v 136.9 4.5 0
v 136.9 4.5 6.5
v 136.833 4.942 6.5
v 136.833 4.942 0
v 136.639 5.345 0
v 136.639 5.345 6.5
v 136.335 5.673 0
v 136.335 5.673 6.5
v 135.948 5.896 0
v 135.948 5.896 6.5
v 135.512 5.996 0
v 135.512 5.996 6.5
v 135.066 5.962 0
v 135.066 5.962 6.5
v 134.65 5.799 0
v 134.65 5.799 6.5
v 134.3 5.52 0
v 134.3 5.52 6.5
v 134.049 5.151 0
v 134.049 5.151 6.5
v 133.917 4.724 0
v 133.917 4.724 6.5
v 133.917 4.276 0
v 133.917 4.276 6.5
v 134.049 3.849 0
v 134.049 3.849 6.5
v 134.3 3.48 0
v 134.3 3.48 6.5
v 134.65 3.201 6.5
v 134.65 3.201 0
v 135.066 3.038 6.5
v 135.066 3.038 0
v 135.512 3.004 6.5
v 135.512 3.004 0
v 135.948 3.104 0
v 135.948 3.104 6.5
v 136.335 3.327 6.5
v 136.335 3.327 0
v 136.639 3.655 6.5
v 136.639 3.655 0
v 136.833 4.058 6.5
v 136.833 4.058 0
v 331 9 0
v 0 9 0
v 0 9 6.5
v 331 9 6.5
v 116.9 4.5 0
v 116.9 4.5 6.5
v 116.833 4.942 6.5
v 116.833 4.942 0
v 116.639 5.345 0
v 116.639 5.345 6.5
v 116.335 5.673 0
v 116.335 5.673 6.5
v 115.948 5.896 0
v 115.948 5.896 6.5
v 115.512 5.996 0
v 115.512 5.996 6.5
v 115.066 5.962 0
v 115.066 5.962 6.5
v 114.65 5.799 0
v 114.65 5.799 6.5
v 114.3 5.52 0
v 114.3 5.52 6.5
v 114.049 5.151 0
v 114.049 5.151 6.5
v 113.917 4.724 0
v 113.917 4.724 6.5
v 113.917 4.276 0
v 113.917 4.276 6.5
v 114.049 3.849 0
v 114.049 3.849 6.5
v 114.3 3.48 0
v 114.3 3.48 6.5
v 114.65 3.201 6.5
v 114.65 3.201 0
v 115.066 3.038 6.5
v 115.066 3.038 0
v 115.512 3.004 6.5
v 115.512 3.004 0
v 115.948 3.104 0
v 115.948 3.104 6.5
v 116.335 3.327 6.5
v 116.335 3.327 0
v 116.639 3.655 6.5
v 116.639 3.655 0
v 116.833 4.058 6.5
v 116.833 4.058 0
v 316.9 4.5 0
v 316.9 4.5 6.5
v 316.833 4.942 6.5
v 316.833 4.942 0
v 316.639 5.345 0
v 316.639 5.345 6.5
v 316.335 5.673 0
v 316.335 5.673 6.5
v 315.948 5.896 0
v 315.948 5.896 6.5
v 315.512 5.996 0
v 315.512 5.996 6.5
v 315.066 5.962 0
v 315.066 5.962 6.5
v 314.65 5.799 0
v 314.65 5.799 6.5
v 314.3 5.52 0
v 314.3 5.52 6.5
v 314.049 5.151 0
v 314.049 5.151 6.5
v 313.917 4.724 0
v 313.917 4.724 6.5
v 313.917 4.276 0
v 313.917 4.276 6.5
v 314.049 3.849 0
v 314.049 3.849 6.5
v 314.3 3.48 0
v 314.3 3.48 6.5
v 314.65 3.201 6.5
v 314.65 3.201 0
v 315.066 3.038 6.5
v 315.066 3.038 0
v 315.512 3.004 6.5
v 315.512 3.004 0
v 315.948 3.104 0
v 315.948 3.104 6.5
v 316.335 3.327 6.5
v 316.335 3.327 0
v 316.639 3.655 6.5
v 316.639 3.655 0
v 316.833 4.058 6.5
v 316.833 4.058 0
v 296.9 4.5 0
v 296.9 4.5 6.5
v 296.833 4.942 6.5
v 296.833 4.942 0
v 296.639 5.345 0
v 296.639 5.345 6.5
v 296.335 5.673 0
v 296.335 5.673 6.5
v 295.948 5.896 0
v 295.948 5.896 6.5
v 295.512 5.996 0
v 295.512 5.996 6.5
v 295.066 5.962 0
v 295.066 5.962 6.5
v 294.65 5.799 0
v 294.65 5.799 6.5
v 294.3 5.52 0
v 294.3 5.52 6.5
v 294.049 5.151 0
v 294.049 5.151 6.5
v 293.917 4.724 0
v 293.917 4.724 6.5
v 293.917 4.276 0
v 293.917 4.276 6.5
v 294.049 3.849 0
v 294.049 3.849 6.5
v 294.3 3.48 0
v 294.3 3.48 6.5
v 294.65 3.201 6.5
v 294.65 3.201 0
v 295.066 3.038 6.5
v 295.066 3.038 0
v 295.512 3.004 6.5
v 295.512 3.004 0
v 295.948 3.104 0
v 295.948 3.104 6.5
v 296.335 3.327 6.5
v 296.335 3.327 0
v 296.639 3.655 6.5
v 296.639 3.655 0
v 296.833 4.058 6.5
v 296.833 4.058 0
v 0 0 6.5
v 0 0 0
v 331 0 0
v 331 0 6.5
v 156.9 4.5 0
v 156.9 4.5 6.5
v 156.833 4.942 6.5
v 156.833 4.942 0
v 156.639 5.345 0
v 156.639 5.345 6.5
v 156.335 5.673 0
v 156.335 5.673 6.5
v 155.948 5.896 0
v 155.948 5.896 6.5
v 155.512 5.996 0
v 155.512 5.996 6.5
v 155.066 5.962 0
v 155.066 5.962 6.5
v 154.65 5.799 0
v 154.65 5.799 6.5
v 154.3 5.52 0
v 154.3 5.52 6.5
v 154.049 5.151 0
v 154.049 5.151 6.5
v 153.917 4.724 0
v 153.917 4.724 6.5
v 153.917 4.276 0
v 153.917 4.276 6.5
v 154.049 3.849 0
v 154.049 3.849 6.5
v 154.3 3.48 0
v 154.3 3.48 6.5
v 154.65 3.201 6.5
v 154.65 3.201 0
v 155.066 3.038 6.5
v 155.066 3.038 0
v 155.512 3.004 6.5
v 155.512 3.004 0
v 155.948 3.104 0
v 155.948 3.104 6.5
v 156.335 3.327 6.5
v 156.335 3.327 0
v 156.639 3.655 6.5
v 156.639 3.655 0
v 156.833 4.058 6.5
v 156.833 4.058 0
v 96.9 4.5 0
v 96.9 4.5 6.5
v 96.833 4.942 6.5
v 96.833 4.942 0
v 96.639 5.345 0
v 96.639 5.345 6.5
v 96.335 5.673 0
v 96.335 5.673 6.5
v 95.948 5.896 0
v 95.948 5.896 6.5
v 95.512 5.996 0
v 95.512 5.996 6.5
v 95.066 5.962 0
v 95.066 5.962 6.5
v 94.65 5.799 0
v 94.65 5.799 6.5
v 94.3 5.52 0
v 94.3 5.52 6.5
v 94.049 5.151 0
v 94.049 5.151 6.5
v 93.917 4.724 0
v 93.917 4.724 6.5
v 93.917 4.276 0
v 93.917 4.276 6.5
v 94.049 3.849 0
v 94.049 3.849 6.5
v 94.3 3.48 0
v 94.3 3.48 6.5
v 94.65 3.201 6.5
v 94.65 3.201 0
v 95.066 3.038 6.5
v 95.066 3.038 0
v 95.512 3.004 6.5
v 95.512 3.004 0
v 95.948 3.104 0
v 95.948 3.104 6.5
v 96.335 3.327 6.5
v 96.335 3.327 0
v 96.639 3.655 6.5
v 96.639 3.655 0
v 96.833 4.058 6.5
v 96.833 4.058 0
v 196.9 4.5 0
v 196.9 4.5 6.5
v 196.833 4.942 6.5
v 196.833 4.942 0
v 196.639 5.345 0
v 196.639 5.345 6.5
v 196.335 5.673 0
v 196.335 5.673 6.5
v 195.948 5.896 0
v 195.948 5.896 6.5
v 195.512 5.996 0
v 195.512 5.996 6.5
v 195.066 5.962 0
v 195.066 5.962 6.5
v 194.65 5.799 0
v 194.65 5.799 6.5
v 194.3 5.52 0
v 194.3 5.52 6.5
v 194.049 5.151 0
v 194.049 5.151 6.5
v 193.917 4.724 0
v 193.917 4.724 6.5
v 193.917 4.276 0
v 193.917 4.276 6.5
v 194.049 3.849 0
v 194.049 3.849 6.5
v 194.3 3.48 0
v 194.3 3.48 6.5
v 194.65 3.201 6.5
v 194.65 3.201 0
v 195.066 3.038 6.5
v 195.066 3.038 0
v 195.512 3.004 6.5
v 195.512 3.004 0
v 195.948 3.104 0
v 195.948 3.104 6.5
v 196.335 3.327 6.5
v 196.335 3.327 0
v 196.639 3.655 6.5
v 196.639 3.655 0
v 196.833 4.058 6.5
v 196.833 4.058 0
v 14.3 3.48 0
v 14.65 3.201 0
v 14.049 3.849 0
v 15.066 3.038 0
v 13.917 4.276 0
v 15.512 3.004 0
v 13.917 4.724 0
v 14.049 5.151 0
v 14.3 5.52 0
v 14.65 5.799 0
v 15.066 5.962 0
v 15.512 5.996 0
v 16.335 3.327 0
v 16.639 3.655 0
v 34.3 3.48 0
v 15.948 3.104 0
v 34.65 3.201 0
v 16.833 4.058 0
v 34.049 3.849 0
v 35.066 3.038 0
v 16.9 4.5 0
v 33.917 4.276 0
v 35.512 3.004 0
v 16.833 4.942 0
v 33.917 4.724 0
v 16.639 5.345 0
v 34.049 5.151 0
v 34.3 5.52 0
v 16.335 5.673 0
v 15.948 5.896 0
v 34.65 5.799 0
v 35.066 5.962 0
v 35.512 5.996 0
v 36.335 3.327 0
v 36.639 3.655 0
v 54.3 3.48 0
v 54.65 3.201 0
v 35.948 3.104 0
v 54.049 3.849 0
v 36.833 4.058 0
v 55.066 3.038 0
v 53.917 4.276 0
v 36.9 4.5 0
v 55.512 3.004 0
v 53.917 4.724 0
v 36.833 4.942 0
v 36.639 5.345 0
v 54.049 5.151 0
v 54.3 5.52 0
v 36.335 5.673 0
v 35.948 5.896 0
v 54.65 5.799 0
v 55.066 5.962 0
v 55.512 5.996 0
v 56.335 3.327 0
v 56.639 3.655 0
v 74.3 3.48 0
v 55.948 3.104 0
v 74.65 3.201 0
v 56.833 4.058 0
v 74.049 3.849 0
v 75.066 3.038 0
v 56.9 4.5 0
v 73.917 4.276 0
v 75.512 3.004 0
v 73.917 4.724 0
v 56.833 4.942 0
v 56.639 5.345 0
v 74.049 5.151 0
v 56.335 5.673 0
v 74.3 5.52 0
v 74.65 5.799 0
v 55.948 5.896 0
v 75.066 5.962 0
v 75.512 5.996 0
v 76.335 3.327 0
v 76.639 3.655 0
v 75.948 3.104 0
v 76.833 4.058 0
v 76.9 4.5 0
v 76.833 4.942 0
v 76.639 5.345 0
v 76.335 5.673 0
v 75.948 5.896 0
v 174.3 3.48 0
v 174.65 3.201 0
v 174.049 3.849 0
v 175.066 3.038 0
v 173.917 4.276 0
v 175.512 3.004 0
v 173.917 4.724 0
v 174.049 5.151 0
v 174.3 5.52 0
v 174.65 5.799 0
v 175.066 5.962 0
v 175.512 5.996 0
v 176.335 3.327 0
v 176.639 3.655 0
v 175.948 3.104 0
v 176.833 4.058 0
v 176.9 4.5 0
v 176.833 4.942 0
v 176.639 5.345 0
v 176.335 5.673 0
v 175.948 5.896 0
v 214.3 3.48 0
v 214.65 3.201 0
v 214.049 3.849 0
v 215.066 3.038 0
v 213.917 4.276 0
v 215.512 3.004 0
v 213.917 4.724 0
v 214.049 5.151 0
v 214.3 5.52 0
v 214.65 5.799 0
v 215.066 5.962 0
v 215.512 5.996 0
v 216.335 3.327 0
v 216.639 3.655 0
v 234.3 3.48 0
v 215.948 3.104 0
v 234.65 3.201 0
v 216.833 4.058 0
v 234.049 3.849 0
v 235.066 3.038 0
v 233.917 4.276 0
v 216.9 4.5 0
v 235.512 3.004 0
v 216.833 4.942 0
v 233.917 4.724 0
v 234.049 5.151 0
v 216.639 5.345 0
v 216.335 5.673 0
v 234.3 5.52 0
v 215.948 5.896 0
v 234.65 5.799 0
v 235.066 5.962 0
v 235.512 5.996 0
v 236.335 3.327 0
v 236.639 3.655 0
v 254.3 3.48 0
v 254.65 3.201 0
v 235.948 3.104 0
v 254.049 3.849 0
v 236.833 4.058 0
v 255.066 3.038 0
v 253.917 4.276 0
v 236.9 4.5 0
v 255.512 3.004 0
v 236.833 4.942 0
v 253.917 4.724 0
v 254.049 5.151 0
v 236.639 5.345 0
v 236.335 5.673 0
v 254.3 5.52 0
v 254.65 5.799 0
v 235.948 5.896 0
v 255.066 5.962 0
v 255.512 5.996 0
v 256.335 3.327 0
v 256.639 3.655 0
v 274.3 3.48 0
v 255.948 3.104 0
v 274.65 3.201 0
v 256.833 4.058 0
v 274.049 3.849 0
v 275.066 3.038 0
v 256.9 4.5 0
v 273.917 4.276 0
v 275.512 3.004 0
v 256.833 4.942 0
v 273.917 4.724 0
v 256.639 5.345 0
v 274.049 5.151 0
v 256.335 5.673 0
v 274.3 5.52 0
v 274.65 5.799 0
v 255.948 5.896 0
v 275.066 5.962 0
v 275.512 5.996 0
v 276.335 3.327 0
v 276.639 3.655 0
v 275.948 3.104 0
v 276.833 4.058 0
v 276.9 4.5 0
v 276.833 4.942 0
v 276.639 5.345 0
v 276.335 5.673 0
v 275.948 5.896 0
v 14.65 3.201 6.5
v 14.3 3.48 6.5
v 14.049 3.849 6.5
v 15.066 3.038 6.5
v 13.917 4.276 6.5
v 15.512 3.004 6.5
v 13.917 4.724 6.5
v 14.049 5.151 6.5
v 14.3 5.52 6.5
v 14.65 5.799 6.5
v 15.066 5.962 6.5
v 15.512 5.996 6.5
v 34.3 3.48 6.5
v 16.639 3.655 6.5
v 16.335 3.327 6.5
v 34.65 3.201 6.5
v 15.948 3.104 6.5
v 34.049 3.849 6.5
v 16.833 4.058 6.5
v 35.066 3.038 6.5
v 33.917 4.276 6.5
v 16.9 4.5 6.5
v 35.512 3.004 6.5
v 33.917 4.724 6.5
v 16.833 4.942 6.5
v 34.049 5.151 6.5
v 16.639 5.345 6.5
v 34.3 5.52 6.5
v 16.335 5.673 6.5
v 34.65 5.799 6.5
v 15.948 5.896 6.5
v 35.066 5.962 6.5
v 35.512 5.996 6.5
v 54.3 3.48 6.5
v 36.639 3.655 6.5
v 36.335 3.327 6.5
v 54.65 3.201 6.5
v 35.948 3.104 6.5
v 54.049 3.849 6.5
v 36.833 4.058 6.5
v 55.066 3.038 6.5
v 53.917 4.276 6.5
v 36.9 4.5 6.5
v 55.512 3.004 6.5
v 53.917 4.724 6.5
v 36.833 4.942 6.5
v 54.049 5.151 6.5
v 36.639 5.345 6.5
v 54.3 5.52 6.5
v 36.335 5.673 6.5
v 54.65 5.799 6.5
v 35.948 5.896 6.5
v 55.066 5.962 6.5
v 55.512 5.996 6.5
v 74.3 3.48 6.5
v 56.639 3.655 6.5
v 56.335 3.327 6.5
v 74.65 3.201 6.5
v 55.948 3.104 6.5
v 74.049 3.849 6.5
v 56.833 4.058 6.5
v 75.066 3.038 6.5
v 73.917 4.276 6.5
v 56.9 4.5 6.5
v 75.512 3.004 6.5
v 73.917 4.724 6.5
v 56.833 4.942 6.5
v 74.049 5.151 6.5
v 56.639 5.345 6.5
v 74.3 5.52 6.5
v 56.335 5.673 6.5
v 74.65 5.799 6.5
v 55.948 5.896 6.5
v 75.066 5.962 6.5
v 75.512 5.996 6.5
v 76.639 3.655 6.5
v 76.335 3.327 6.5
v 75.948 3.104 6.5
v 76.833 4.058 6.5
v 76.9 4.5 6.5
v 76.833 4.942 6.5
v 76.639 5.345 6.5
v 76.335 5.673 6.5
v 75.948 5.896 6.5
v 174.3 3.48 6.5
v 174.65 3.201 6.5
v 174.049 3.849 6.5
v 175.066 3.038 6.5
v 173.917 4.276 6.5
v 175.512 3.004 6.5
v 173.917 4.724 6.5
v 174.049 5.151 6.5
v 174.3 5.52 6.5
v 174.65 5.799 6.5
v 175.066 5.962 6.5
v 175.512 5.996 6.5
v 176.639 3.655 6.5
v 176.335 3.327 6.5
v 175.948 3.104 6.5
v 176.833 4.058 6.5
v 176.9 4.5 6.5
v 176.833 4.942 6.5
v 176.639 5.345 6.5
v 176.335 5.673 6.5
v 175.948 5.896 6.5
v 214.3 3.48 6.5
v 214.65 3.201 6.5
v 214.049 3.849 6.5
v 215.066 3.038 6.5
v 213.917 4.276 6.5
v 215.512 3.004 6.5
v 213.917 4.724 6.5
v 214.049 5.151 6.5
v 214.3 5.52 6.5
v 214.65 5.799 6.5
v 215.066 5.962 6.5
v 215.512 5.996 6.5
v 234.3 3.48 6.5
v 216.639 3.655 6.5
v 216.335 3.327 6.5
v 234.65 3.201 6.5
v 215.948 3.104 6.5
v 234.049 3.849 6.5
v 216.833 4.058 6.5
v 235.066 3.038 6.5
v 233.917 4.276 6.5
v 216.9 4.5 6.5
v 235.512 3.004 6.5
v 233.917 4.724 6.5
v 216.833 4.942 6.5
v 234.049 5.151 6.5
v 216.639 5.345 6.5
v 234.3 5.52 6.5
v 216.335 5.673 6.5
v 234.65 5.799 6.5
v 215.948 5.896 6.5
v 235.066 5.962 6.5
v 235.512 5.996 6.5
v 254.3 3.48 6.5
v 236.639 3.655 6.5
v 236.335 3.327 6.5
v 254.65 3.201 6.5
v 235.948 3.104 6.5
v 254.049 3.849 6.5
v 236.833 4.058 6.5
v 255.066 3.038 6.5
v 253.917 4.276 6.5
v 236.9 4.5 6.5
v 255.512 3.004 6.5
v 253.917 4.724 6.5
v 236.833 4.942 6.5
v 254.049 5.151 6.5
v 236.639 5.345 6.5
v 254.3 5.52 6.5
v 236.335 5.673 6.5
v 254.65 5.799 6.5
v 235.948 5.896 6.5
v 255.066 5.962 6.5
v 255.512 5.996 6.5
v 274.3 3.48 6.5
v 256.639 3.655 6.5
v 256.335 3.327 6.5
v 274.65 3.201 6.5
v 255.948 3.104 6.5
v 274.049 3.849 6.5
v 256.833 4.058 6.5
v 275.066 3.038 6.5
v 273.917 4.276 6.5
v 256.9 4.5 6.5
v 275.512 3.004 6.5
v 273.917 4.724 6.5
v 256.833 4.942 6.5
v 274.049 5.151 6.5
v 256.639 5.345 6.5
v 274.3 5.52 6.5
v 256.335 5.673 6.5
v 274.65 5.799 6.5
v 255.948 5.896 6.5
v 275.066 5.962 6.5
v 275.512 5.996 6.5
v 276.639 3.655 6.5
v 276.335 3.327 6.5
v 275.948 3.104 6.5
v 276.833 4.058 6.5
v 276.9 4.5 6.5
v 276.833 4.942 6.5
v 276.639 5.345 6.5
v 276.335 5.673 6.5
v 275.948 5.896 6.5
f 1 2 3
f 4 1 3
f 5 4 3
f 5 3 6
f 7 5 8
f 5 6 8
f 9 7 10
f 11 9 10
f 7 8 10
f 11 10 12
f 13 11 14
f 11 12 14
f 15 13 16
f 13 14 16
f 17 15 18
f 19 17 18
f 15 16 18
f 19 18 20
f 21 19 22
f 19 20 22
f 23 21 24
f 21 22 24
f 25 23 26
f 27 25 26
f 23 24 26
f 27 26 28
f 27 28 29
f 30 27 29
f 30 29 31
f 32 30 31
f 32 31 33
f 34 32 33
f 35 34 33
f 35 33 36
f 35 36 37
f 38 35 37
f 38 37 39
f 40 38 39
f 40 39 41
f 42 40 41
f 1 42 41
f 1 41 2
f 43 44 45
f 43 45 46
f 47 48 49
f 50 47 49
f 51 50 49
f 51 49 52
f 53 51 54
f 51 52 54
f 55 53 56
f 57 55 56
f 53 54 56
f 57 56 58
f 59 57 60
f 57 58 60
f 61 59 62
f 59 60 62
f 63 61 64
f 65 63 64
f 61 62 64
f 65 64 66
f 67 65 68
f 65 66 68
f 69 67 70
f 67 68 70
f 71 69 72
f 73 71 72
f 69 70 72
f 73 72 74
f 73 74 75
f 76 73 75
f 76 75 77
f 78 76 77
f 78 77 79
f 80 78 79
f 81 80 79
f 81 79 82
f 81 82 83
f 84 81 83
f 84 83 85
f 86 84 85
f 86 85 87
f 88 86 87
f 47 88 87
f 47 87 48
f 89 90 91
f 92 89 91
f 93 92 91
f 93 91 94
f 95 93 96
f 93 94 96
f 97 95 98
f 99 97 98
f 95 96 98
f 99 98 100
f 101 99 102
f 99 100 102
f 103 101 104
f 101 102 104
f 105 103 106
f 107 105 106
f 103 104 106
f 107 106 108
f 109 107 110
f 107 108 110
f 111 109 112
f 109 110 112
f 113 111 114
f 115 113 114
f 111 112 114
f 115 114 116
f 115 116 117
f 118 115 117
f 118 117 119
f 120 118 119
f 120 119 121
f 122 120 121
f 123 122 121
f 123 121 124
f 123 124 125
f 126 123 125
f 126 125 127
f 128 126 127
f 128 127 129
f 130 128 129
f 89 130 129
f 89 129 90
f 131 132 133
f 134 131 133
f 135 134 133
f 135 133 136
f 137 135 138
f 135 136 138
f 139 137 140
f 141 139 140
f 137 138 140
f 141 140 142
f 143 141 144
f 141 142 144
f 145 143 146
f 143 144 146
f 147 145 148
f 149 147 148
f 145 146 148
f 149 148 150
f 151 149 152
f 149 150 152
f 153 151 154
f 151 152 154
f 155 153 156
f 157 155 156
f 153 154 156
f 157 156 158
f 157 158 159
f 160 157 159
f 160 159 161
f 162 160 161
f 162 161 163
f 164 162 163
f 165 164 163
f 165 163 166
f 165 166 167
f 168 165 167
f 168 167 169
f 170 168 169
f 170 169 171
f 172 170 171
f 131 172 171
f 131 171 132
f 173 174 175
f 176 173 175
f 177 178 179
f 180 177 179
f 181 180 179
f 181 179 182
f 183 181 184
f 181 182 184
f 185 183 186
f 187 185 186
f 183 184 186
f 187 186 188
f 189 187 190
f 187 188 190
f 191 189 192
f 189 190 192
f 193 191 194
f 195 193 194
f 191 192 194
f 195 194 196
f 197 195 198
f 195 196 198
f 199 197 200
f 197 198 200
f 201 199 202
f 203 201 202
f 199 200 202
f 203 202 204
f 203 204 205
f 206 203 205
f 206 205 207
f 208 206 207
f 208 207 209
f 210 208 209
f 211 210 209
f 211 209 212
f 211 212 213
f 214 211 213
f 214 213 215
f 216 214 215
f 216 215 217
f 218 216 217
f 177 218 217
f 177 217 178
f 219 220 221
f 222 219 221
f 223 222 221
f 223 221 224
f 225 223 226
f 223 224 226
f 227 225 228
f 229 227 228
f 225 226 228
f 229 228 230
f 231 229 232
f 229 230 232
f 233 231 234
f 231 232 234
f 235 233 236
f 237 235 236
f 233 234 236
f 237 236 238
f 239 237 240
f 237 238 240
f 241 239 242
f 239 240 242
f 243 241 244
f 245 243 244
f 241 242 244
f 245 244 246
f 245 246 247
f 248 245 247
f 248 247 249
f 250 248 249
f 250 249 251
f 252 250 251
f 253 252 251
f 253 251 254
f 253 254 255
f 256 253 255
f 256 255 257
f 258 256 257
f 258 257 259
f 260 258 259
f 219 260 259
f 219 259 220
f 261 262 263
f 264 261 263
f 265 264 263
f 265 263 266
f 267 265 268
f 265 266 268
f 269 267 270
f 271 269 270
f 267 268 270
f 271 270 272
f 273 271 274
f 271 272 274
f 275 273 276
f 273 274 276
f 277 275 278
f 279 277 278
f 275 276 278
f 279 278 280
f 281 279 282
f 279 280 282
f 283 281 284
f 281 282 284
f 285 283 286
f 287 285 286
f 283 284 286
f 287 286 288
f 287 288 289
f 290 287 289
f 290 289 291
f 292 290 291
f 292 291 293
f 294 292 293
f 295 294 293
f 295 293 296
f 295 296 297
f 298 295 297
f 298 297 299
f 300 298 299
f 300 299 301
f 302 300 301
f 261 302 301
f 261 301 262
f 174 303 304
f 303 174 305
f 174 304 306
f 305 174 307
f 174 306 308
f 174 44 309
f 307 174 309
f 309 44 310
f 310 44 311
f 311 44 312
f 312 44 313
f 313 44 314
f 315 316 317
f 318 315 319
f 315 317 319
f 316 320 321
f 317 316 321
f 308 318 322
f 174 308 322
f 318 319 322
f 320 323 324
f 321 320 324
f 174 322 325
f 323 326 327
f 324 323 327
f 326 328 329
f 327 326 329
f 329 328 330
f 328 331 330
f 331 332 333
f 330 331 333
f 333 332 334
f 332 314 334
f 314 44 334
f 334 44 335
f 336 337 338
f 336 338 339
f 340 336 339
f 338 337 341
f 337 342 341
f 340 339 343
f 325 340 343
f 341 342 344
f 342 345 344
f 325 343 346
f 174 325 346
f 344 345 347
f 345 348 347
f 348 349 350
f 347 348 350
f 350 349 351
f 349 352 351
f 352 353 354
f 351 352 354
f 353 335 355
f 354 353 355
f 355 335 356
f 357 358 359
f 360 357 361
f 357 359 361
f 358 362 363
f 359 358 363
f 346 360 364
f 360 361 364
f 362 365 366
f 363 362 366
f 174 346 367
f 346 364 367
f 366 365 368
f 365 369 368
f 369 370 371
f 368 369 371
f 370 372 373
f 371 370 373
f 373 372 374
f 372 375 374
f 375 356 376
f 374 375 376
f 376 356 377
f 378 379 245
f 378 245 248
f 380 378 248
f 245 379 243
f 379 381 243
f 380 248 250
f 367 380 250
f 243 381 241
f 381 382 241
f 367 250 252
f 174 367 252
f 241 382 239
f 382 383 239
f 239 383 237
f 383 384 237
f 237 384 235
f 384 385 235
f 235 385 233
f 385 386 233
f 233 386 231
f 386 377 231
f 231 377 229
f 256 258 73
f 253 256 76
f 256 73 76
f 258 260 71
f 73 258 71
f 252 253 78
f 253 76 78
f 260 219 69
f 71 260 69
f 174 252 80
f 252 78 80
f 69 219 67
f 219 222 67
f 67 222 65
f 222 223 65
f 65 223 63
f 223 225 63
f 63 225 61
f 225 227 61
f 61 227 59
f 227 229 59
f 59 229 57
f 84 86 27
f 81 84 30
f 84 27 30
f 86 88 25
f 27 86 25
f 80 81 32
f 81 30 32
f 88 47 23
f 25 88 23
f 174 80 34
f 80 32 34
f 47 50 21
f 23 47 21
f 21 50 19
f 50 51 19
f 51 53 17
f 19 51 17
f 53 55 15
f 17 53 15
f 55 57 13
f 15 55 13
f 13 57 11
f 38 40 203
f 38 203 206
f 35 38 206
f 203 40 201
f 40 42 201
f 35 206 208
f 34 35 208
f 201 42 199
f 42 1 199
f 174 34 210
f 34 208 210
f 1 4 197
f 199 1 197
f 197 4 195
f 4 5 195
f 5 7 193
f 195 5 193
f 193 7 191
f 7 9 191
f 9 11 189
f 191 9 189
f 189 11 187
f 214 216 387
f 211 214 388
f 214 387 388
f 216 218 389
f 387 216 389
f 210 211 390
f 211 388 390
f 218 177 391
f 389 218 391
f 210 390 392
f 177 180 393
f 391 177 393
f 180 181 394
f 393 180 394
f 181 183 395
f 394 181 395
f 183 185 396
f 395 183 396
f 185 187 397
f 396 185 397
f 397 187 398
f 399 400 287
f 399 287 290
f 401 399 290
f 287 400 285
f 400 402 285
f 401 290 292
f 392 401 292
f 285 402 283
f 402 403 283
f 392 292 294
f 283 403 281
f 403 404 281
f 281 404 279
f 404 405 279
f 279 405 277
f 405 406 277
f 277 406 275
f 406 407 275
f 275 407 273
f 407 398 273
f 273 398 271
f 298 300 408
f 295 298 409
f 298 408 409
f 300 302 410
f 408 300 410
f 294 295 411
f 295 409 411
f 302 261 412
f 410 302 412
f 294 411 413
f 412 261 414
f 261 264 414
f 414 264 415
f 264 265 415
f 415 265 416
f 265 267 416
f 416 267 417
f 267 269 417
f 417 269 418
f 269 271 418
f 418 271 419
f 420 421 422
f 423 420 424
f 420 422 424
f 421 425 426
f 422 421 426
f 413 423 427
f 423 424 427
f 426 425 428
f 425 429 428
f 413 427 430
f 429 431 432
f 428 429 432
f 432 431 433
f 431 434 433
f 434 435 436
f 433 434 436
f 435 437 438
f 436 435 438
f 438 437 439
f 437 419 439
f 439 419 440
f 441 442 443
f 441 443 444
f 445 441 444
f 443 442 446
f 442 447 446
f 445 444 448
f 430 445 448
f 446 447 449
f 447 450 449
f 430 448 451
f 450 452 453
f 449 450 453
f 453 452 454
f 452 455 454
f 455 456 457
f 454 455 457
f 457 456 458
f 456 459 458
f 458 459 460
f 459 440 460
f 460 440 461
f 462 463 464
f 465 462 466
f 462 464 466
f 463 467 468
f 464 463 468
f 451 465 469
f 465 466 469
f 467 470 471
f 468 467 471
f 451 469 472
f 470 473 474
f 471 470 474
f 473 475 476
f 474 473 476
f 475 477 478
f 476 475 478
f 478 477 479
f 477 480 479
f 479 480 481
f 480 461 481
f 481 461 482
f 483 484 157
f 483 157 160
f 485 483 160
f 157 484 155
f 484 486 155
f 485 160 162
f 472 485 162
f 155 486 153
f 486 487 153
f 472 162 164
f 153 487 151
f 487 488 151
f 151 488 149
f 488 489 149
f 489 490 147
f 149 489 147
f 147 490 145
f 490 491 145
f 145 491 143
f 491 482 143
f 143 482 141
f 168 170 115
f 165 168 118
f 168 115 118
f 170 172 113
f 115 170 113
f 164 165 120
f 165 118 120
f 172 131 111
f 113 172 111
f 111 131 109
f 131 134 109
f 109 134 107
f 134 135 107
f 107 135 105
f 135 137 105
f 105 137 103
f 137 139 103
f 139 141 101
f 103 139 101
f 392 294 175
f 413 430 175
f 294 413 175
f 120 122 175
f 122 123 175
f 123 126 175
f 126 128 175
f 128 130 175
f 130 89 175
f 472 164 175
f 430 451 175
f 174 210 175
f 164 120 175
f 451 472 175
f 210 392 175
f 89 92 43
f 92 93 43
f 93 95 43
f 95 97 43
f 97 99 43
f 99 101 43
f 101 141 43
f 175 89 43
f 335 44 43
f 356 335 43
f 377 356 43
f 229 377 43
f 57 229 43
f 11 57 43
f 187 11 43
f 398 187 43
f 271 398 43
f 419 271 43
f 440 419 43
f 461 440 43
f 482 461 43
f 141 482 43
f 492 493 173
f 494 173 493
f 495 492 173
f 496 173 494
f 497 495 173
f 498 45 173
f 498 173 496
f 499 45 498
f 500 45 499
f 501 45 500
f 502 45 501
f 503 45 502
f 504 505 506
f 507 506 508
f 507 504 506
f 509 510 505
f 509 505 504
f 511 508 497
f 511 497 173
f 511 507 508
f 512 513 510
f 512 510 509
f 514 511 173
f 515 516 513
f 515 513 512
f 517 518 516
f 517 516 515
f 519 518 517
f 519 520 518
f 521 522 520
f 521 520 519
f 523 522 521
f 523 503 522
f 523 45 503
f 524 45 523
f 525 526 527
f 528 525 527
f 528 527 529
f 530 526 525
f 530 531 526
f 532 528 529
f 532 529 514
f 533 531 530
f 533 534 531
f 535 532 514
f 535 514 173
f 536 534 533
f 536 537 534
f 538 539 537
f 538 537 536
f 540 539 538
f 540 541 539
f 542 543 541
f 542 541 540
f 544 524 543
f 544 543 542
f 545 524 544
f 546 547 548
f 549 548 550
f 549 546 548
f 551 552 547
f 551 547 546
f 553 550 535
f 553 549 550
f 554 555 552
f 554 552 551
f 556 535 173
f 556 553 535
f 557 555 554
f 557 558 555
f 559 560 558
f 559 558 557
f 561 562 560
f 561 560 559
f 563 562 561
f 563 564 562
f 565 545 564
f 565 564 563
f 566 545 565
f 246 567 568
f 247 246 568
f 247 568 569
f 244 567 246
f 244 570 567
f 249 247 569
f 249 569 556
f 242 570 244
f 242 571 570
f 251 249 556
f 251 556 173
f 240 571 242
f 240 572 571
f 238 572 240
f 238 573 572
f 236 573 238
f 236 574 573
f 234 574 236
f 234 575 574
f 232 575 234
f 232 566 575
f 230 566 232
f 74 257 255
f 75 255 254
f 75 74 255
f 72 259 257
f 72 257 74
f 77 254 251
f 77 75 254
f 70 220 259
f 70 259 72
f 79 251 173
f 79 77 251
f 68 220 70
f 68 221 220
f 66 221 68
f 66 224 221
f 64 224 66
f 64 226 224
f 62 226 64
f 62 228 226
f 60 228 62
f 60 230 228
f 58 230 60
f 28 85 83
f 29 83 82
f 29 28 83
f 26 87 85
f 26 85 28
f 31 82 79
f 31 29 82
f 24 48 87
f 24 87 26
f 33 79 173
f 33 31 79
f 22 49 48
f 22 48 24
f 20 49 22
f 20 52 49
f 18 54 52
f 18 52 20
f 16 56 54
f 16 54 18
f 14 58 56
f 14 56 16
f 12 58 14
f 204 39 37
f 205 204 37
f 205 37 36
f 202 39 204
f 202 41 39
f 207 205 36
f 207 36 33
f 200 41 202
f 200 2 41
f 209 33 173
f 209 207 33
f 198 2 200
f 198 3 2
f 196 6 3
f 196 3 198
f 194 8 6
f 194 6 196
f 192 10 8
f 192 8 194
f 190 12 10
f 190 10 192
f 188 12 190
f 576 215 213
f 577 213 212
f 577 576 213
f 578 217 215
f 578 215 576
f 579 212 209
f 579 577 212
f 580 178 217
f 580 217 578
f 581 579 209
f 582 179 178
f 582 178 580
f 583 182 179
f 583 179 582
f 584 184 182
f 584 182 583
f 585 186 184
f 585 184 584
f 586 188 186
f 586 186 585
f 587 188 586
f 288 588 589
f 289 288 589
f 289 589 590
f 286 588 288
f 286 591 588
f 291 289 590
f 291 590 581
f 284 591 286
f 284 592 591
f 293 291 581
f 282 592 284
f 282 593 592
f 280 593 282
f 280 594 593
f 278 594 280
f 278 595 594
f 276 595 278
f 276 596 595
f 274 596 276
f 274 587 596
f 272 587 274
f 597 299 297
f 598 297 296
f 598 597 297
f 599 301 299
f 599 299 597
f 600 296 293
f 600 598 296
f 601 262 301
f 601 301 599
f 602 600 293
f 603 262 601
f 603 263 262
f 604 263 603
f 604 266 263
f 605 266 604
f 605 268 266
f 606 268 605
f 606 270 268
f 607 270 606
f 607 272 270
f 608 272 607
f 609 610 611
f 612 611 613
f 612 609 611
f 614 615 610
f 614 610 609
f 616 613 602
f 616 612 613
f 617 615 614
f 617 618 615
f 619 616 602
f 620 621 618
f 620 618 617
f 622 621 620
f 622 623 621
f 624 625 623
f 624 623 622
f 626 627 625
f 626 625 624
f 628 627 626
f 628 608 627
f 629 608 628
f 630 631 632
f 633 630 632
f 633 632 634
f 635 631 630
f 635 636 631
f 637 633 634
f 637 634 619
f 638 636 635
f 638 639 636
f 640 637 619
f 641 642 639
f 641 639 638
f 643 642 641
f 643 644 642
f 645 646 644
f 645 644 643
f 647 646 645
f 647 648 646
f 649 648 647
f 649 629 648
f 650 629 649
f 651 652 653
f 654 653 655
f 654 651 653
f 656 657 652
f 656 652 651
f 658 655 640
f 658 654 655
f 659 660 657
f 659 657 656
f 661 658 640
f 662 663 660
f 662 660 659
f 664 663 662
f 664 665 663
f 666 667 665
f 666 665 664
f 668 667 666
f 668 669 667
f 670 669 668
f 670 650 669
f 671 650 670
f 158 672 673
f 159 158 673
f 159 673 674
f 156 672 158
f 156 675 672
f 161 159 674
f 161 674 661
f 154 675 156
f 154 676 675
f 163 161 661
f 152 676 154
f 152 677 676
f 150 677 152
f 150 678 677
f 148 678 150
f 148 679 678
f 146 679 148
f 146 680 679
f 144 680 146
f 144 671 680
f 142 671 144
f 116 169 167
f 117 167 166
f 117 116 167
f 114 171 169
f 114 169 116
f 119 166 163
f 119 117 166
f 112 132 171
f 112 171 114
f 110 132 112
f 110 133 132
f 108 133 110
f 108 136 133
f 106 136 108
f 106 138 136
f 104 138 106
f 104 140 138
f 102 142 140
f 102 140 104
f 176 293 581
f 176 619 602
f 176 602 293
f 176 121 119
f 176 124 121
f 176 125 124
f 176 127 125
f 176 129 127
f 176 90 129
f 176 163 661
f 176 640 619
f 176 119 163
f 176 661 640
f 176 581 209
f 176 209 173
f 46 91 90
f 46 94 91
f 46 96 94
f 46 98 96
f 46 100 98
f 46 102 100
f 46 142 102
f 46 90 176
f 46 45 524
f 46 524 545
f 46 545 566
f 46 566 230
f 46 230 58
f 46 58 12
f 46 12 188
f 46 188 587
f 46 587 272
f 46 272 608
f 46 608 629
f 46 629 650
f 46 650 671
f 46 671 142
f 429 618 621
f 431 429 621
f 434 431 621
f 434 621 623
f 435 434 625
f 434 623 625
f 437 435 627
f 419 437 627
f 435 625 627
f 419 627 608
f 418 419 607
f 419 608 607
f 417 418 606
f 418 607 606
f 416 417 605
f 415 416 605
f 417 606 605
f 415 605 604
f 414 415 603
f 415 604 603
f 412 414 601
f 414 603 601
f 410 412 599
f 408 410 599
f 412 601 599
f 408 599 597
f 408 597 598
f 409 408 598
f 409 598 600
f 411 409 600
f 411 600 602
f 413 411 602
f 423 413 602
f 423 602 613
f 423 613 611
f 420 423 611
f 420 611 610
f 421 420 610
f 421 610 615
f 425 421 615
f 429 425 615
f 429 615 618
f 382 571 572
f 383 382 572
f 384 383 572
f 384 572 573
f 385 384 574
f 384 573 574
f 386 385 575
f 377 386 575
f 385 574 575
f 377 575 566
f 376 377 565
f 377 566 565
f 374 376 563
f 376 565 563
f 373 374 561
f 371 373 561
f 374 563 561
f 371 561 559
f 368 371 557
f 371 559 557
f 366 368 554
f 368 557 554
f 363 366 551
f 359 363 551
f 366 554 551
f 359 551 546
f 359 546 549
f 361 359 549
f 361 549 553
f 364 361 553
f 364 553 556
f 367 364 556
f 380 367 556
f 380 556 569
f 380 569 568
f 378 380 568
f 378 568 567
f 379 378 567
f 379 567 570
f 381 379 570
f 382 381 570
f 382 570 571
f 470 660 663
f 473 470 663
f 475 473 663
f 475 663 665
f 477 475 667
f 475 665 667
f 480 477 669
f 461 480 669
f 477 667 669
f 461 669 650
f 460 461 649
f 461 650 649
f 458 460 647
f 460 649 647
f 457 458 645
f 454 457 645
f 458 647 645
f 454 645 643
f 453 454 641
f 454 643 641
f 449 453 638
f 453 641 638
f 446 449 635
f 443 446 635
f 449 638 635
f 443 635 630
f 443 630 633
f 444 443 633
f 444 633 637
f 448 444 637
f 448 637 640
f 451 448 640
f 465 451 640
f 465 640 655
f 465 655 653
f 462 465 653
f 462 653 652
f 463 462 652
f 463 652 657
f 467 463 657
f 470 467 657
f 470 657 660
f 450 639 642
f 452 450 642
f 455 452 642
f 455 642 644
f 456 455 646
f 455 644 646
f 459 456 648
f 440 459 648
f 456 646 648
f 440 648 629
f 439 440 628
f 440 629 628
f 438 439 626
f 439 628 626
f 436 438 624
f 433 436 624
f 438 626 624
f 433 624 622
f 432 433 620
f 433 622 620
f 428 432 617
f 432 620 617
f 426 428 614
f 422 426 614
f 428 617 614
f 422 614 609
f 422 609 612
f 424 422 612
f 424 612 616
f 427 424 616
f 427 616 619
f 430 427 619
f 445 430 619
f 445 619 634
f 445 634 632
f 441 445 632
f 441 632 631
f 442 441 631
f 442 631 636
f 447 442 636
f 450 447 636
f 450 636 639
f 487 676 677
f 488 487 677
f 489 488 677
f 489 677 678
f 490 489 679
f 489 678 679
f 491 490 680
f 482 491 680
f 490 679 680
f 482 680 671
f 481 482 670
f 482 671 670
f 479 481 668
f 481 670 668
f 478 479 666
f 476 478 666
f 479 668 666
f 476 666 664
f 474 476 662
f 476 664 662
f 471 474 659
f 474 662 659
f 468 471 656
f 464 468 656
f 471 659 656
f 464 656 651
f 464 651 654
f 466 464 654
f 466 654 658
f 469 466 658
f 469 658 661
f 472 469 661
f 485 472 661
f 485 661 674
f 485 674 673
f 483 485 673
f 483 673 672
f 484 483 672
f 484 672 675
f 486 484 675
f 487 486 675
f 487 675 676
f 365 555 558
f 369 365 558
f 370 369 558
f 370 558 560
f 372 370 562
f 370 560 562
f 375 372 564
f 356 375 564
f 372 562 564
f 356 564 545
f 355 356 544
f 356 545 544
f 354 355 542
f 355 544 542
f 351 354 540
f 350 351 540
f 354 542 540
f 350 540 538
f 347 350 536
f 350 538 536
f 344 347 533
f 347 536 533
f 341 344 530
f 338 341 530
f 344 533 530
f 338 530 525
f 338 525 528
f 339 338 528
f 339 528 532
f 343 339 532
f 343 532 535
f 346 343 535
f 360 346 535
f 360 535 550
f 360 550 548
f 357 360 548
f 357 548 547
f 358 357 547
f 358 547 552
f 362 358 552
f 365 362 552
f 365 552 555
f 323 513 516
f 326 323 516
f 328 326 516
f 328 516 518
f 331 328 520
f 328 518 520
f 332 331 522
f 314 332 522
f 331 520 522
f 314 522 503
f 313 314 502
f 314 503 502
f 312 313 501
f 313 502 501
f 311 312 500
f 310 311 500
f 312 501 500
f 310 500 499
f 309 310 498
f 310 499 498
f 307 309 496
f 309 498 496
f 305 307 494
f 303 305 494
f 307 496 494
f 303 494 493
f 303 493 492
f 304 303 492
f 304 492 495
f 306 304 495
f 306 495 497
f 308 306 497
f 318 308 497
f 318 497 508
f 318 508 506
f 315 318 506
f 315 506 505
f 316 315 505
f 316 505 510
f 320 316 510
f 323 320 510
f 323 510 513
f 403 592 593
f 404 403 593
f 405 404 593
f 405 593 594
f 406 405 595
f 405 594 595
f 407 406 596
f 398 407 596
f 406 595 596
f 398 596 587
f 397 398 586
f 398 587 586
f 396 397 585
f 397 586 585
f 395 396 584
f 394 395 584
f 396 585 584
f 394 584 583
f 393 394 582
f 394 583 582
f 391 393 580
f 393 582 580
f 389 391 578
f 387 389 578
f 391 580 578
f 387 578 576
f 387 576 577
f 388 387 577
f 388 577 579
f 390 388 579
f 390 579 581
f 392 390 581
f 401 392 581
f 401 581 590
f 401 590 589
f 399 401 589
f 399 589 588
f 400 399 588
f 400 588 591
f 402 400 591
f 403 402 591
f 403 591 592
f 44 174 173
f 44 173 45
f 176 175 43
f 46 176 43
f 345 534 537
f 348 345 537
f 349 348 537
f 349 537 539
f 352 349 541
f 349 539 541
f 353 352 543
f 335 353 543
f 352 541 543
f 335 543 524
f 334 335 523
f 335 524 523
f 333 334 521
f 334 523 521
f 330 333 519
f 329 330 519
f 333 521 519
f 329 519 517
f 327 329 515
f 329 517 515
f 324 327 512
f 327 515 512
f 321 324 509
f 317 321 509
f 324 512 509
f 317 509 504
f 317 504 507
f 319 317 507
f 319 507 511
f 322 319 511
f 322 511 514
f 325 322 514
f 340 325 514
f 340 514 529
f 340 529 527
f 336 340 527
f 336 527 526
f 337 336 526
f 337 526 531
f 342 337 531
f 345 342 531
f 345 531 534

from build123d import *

# Parameters (mm, degrees)
SKETCH_W            = 331
SKETCH_H            = 9
PAD_DEPTH           = 6.5
SKETCH001_R         = 1.5
POCKET_DEPTH        = 6.501
LINEARPATTERN_COUNT = 16
LINEARPATTERN_PITCH = 20


with BuildPart() as part:
    # Sketch → Pad (new body)
    with BuildSketch(Plane.XY):
        with Locations((165.5, 4.5)):
            Rectangle(SKETCH_W, SKETCH_H)
    extrude(amount=PAD_DEPTH)

    # Sketch001 (on Face6 of Pad) → Pocket (cut, through all)
    with BuildSketch(Plane.XY.offset(6.5)):
        with Locations((15.4, 4.5)):
            Circle(SKETCH001_R)
    pocket = extrude(amount=-POCKET_DEPTH, mode=Mode.SUBTRACT)

    # LinearPattern: Pocket ×16
    with Locations(*[(i * LINEARPATTERN_PITCH, 0, 0) for i in range(1, LINEARPATTERN_COUNT)]):
        add(pocket, mode=Mode.SUBTRACT)


solid = part.part
